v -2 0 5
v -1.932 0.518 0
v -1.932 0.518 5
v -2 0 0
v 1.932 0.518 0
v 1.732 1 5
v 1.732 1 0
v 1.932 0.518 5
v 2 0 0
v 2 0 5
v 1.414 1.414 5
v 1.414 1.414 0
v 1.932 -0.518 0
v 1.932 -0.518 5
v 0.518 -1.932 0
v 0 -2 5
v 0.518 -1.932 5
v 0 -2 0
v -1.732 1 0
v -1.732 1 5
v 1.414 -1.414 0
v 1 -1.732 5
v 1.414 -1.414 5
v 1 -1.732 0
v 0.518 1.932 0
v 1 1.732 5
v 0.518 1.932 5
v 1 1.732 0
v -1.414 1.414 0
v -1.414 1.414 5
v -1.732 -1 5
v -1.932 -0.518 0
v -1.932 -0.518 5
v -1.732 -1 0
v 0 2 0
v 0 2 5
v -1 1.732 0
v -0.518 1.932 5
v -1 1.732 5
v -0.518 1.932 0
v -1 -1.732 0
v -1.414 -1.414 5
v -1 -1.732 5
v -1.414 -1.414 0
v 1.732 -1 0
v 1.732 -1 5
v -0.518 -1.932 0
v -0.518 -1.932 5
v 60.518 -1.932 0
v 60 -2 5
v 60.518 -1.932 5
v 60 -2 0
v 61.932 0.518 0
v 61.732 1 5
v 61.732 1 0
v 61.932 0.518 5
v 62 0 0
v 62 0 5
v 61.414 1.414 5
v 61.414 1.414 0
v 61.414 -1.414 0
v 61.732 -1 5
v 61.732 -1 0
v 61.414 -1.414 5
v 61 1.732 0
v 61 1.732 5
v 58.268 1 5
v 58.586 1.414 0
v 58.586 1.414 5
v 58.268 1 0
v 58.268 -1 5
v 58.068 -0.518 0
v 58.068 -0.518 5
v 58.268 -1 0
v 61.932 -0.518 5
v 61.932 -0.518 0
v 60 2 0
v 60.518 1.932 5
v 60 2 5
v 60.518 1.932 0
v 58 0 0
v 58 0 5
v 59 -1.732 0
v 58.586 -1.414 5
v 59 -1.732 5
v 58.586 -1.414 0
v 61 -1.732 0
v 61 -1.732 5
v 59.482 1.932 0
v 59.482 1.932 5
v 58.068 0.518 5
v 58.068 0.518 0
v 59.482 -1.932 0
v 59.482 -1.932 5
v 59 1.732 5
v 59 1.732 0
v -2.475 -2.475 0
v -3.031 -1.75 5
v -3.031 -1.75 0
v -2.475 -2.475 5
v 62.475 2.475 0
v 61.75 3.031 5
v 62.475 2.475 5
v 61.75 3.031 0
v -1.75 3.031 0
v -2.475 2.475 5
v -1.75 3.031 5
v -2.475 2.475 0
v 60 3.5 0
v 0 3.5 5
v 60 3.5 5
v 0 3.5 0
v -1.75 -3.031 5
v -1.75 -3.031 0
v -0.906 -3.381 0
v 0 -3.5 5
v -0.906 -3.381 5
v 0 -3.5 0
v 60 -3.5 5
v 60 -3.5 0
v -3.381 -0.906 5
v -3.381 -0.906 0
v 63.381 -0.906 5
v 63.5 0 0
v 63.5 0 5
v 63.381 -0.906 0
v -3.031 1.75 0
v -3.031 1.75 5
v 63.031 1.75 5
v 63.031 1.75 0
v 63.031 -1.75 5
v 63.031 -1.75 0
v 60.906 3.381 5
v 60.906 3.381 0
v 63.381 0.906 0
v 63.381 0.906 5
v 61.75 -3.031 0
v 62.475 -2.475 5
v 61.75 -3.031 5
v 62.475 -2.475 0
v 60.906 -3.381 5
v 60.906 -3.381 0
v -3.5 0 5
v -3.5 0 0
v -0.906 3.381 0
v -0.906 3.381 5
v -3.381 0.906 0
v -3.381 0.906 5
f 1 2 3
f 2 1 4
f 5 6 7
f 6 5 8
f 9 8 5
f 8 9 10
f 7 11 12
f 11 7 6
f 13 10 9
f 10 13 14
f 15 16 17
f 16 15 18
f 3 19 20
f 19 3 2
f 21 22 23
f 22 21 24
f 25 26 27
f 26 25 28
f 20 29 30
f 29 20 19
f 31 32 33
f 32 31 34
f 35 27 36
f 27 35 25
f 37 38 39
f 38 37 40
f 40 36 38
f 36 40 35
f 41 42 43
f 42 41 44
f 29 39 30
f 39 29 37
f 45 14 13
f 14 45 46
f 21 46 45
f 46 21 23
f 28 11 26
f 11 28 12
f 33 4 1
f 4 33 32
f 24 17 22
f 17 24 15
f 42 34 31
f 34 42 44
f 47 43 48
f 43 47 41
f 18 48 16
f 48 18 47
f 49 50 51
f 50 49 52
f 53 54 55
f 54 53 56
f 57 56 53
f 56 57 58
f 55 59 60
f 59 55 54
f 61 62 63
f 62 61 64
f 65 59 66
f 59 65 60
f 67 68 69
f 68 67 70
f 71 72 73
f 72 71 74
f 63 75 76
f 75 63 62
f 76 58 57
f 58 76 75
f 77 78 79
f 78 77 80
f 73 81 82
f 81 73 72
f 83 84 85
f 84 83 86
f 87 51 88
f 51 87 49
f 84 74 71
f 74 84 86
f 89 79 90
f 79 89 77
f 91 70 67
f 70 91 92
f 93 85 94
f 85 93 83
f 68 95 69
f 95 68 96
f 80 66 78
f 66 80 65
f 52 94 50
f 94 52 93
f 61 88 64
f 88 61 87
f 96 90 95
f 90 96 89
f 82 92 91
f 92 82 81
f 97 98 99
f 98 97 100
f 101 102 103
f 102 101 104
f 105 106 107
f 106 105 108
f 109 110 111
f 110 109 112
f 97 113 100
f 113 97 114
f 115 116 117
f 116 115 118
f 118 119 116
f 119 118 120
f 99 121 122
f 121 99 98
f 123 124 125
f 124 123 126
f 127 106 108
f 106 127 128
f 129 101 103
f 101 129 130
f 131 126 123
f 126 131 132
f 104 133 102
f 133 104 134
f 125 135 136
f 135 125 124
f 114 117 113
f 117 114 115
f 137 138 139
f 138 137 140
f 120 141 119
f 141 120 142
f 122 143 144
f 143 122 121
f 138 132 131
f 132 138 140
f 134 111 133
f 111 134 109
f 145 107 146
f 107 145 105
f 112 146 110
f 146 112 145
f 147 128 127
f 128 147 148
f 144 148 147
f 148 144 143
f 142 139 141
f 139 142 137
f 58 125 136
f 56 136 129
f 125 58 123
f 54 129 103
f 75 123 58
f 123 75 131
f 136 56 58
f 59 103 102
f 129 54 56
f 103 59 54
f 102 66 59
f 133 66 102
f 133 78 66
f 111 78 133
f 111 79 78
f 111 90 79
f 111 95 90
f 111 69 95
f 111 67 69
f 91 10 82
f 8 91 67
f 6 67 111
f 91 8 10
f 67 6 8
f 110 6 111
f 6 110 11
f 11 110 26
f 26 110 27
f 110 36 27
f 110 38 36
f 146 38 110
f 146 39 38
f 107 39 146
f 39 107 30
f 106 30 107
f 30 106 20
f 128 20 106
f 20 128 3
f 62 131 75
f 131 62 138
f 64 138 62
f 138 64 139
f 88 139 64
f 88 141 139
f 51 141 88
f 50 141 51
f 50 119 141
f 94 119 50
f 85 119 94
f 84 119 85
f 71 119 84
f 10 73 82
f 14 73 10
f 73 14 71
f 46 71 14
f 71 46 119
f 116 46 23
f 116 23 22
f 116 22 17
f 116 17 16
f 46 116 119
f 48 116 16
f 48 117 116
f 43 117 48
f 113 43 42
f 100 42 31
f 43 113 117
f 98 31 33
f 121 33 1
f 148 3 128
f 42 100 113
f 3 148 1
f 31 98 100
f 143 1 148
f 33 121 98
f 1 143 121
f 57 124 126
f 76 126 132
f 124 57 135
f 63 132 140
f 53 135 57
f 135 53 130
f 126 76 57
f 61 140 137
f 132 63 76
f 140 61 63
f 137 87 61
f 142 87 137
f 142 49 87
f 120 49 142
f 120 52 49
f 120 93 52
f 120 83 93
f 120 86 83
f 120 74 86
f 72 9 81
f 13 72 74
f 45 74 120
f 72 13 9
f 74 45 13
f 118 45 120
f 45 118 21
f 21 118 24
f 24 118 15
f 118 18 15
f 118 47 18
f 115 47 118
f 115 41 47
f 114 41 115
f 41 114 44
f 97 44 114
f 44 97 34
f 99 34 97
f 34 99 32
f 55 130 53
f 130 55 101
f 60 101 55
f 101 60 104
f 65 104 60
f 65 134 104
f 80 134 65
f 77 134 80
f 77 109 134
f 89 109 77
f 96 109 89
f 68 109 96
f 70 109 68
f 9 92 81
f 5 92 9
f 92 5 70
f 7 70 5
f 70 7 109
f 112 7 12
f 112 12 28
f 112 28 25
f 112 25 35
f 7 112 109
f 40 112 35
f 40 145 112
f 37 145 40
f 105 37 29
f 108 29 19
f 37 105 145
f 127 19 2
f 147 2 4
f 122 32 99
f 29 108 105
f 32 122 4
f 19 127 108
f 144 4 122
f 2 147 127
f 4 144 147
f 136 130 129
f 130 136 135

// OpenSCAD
// file: config.scad
e = 0.01;

// Real Sterilite Tote Size
//toteHeight = 125;
//toteTopWidth = 200;
//toteBottomWidth = 155;
//toteTopLength = 355;
//toteBottomLength = 300;

// Scaled Size
toteHeight = 30;
toteTopWidth = 60;
toteBottomWidth = 45;
toteTopLength = 105;
toteBottomLength = 90;

// Parameters
fingerHeight = 5;
fingerClearance = 5;

armatureHeight = 10;
armatureThickness = 20;

baseHeight = 20;
baseThickness = 10;

boltDiameter = 3;
pinDiameter = 4;

base2Height = 20;

totesPerRow = 3;
// main file
include <config.scad>;

module armConnector() {
  armLength = (totesPerRow-2)*toteTopWidth;

  difference() {
    hull()
      for (x = [0, 1])
        translate([x*armLength, 0, 0])
          cylinder(d = 7, h = 5, $fn = 24);

    for (x = [0, 1])
      translate([x*armLength, 0, -e/2])
        cylinder(d = 4, h = 5 + e, $fn = 24);
  }
}

armConnector();
